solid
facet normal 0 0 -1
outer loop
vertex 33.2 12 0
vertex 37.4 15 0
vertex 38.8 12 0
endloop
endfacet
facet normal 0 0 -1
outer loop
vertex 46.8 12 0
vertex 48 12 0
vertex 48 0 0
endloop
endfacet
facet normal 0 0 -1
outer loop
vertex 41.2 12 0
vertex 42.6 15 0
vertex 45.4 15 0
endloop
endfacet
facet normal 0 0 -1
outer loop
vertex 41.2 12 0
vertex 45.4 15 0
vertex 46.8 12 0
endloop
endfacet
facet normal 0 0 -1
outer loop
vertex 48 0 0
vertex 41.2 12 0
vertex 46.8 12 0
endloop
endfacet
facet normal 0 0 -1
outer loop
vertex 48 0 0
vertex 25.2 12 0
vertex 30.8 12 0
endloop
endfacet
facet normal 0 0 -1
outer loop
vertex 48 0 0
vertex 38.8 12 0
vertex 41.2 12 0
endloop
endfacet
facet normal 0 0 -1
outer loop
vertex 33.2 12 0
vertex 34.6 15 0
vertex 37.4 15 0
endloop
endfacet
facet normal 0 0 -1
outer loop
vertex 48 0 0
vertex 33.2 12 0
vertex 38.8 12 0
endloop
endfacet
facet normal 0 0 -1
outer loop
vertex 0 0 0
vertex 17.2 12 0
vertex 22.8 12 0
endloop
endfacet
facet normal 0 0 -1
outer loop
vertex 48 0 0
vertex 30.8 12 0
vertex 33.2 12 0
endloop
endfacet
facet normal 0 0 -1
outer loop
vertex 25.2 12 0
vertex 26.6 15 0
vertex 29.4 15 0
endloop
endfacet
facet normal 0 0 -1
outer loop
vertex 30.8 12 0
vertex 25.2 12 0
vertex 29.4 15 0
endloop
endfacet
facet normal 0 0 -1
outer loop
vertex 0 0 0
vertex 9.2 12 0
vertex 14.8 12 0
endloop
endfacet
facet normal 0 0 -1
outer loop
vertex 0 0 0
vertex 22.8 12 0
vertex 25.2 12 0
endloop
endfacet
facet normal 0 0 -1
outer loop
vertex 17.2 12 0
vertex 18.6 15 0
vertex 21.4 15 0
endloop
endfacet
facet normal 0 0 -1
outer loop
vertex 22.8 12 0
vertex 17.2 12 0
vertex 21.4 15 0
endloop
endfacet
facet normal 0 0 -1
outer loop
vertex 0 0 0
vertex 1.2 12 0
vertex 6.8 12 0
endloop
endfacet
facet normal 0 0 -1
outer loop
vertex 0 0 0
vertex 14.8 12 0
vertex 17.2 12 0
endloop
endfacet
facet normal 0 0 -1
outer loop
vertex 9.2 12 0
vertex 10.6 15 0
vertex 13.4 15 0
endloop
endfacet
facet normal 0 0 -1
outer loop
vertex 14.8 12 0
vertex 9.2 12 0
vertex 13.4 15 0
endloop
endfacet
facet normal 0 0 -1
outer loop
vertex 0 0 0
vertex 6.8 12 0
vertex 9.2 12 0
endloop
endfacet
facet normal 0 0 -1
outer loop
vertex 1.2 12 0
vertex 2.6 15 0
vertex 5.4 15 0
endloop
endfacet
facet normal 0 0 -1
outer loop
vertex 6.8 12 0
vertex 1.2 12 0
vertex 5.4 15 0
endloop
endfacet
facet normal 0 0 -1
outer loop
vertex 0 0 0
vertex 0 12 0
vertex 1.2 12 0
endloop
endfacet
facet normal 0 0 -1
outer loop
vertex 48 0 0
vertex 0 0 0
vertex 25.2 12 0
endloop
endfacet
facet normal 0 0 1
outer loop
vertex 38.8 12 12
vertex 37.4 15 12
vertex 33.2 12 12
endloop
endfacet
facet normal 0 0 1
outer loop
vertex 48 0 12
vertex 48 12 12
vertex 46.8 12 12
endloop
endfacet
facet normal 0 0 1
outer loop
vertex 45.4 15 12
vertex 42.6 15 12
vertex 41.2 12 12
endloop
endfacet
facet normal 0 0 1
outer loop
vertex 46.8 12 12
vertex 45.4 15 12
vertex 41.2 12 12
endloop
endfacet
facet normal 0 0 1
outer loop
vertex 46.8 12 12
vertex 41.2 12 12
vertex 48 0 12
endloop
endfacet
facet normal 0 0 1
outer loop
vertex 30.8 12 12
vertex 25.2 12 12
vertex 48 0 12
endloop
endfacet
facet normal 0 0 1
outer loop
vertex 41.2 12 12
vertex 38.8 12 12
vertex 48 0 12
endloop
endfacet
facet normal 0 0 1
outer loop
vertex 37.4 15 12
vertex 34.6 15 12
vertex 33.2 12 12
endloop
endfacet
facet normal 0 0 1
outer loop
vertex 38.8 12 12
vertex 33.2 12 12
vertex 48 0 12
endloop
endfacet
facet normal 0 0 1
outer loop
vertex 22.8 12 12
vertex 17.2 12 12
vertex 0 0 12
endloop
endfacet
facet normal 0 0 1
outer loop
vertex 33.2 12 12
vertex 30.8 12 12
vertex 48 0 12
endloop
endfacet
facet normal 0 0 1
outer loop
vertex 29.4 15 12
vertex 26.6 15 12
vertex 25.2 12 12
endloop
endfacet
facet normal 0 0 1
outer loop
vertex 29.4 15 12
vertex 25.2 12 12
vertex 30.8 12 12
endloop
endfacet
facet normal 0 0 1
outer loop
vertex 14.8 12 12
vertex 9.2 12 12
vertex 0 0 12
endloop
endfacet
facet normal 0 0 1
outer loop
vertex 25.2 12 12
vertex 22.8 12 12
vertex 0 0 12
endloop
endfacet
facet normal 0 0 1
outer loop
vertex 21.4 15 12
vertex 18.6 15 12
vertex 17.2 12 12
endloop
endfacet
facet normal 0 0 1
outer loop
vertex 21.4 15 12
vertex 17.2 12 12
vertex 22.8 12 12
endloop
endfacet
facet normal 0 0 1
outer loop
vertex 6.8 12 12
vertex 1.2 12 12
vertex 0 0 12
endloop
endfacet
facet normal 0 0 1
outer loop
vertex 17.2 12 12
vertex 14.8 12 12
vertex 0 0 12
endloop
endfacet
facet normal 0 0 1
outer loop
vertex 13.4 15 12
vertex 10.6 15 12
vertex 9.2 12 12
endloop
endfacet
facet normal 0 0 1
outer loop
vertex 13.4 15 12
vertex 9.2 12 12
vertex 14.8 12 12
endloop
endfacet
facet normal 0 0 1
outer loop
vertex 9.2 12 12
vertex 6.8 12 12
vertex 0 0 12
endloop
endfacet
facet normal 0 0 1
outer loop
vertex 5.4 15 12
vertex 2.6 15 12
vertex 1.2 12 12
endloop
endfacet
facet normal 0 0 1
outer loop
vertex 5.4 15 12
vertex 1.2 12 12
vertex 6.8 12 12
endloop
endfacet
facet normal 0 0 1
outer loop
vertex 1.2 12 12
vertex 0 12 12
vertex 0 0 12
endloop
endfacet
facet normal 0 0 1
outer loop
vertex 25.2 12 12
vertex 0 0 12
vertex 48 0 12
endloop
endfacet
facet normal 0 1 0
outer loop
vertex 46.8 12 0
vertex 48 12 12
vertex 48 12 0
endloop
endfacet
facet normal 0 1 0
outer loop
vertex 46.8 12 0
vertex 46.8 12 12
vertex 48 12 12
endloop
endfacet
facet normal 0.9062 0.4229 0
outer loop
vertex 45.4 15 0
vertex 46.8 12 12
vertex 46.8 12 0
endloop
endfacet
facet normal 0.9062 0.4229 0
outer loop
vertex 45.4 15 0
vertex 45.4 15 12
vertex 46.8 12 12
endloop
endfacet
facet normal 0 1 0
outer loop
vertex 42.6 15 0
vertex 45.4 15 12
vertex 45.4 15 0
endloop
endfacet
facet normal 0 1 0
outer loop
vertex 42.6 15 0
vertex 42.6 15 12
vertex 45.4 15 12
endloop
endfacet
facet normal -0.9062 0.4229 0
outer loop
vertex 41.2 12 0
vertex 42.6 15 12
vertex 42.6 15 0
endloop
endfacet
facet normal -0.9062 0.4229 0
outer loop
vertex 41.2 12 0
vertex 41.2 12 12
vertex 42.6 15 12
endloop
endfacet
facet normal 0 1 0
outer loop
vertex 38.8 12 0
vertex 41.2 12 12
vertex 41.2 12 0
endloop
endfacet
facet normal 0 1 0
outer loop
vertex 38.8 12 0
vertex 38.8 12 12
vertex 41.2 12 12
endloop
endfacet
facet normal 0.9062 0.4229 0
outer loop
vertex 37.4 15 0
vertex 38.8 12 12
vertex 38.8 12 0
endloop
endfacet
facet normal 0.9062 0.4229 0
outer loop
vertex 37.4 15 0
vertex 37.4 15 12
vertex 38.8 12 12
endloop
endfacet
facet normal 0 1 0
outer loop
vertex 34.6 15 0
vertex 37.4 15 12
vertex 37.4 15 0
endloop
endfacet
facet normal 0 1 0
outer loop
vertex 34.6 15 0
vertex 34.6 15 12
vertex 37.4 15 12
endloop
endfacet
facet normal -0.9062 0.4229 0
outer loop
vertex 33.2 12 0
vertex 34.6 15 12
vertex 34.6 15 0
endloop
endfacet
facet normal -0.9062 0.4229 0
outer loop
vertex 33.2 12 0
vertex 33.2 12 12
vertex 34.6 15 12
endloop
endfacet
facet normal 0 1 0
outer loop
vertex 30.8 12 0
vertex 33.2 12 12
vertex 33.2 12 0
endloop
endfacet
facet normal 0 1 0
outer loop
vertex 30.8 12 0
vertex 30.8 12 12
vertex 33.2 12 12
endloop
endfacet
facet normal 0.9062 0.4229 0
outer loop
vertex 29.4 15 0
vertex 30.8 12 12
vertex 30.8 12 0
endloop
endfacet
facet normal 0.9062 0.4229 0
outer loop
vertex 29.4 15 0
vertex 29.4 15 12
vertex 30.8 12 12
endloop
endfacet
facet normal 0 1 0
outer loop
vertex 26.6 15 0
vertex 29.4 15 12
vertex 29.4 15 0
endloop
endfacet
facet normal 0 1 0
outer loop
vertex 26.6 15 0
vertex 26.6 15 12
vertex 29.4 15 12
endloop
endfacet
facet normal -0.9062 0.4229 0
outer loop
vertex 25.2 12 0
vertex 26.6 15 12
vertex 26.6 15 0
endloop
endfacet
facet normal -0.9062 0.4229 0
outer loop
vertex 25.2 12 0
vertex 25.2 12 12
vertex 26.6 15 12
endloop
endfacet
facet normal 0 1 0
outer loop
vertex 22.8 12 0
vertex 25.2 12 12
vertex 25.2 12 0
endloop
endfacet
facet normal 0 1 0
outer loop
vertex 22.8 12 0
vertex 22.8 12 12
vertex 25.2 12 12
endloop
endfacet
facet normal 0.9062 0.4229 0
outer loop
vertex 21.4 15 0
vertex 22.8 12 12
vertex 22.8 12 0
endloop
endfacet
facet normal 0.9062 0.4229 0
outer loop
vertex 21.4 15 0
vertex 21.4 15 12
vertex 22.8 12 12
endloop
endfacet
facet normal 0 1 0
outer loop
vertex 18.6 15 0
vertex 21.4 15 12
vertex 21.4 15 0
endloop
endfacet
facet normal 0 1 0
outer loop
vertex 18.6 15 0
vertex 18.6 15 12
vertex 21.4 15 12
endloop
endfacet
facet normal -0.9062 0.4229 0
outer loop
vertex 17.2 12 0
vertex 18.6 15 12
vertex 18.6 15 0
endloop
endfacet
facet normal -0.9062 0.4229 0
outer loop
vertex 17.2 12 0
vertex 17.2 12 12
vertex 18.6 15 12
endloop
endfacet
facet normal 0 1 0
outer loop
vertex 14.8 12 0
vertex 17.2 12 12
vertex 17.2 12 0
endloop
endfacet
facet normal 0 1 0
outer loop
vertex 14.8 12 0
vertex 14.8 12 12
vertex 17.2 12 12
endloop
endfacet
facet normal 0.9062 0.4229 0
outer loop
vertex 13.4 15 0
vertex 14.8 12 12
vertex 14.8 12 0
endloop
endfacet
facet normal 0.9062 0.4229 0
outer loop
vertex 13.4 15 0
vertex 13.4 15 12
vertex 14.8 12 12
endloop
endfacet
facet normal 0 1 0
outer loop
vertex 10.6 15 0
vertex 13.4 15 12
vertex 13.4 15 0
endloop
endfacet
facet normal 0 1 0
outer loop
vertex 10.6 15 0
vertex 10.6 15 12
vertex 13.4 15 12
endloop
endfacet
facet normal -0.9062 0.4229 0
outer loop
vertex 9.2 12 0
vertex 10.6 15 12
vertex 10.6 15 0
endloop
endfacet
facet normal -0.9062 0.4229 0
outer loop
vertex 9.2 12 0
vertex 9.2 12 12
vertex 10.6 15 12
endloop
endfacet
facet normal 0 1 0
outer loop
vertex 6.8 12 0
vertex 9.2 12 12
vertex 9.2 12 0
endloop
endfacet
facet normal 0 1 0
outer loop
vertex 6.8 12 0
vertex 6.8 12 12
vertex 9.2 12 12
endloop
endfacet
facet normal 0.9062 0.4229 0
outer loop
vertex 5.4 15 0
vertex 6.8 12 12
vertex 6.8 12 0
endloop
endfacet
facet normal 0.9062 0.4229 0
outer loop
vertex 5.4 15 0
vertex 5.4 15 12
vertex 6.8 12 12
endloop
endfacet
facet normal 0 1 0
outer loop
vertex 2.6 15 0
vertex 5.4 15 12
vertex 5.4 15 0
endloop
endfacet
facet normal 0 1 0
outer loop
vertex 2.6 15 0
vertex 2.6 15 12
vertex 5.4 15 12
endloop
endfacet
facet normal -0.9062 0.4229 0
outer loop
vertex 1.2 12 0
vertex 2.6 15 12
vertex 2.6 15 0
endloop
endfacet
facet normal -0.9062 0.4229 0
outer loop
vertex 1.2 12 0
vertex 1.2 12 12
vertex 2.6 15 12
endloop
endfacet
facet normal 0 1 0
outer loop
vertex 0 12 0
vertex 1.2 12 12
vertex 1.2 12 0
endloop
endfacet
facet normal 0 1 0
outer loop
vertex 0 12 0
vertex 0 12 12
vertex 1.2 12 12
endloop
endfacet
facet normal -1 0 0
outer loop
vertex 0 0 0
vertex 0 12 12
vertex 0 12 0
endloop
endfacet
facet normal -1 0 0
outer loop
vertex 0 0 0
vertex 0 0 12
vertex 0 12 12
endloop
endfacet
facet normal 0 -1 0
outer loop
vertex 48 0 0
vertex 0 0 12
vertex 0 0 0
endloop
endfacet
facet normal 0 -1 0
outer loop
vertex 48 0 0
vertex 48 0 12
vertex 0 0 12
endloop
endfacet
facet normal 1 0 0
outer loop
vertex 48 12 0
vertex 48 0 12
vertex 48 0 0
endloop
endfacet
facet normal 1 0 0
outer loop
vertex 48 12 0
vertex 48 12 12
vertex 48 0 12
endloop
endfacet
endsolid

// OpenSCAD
$fn = 32;

// ----------------------------------------------------------------------
// Gear rack: 6 teeth, pitch 8 mm
// ----------------------------------------------------------------------

// --- parameters (mm) ---
teeth = 6;                // number of teeth
pitch = 8;                // tooth pitch, X
root_w = 5.6;             // tooth width at the root
tip_w = 2.8;              // tooth width at the tip
base_h = 12;              // rack body height, Y
tooth_h = 3;              // tooth height above the body
plate_t = 12;             // rack width, Z (extrusion height)

rack_l = teeth * pitch;  // overall length
total_h = base_h + tooth_h;  // overall height

profile = [[0, 0], [48, 0], [48, 12], [46.8, 12], [45.4, 15], [42.6, 15], [41.2, 12], [38.8, 12], [37.4, 15], [34.6, 15], [33.2, 12], [30.8, 12], [29.4, 15], [26.6, 15], [25.2, 12], [22.8, 12], [21.4, 15], [18.6, 15], [17.2, 12], [14.8, 12], [13.4, 15], [10.6, 15], [9.2, 12], [6.8, 12], [5.4, 15], [2.6, 15], [1.2, 12], [0, 12]];  // primary outline, 28 points, counter clockwise

// --- the one profile operation ---
linear_extrude(height = plate_t) polygon(points = profile);
